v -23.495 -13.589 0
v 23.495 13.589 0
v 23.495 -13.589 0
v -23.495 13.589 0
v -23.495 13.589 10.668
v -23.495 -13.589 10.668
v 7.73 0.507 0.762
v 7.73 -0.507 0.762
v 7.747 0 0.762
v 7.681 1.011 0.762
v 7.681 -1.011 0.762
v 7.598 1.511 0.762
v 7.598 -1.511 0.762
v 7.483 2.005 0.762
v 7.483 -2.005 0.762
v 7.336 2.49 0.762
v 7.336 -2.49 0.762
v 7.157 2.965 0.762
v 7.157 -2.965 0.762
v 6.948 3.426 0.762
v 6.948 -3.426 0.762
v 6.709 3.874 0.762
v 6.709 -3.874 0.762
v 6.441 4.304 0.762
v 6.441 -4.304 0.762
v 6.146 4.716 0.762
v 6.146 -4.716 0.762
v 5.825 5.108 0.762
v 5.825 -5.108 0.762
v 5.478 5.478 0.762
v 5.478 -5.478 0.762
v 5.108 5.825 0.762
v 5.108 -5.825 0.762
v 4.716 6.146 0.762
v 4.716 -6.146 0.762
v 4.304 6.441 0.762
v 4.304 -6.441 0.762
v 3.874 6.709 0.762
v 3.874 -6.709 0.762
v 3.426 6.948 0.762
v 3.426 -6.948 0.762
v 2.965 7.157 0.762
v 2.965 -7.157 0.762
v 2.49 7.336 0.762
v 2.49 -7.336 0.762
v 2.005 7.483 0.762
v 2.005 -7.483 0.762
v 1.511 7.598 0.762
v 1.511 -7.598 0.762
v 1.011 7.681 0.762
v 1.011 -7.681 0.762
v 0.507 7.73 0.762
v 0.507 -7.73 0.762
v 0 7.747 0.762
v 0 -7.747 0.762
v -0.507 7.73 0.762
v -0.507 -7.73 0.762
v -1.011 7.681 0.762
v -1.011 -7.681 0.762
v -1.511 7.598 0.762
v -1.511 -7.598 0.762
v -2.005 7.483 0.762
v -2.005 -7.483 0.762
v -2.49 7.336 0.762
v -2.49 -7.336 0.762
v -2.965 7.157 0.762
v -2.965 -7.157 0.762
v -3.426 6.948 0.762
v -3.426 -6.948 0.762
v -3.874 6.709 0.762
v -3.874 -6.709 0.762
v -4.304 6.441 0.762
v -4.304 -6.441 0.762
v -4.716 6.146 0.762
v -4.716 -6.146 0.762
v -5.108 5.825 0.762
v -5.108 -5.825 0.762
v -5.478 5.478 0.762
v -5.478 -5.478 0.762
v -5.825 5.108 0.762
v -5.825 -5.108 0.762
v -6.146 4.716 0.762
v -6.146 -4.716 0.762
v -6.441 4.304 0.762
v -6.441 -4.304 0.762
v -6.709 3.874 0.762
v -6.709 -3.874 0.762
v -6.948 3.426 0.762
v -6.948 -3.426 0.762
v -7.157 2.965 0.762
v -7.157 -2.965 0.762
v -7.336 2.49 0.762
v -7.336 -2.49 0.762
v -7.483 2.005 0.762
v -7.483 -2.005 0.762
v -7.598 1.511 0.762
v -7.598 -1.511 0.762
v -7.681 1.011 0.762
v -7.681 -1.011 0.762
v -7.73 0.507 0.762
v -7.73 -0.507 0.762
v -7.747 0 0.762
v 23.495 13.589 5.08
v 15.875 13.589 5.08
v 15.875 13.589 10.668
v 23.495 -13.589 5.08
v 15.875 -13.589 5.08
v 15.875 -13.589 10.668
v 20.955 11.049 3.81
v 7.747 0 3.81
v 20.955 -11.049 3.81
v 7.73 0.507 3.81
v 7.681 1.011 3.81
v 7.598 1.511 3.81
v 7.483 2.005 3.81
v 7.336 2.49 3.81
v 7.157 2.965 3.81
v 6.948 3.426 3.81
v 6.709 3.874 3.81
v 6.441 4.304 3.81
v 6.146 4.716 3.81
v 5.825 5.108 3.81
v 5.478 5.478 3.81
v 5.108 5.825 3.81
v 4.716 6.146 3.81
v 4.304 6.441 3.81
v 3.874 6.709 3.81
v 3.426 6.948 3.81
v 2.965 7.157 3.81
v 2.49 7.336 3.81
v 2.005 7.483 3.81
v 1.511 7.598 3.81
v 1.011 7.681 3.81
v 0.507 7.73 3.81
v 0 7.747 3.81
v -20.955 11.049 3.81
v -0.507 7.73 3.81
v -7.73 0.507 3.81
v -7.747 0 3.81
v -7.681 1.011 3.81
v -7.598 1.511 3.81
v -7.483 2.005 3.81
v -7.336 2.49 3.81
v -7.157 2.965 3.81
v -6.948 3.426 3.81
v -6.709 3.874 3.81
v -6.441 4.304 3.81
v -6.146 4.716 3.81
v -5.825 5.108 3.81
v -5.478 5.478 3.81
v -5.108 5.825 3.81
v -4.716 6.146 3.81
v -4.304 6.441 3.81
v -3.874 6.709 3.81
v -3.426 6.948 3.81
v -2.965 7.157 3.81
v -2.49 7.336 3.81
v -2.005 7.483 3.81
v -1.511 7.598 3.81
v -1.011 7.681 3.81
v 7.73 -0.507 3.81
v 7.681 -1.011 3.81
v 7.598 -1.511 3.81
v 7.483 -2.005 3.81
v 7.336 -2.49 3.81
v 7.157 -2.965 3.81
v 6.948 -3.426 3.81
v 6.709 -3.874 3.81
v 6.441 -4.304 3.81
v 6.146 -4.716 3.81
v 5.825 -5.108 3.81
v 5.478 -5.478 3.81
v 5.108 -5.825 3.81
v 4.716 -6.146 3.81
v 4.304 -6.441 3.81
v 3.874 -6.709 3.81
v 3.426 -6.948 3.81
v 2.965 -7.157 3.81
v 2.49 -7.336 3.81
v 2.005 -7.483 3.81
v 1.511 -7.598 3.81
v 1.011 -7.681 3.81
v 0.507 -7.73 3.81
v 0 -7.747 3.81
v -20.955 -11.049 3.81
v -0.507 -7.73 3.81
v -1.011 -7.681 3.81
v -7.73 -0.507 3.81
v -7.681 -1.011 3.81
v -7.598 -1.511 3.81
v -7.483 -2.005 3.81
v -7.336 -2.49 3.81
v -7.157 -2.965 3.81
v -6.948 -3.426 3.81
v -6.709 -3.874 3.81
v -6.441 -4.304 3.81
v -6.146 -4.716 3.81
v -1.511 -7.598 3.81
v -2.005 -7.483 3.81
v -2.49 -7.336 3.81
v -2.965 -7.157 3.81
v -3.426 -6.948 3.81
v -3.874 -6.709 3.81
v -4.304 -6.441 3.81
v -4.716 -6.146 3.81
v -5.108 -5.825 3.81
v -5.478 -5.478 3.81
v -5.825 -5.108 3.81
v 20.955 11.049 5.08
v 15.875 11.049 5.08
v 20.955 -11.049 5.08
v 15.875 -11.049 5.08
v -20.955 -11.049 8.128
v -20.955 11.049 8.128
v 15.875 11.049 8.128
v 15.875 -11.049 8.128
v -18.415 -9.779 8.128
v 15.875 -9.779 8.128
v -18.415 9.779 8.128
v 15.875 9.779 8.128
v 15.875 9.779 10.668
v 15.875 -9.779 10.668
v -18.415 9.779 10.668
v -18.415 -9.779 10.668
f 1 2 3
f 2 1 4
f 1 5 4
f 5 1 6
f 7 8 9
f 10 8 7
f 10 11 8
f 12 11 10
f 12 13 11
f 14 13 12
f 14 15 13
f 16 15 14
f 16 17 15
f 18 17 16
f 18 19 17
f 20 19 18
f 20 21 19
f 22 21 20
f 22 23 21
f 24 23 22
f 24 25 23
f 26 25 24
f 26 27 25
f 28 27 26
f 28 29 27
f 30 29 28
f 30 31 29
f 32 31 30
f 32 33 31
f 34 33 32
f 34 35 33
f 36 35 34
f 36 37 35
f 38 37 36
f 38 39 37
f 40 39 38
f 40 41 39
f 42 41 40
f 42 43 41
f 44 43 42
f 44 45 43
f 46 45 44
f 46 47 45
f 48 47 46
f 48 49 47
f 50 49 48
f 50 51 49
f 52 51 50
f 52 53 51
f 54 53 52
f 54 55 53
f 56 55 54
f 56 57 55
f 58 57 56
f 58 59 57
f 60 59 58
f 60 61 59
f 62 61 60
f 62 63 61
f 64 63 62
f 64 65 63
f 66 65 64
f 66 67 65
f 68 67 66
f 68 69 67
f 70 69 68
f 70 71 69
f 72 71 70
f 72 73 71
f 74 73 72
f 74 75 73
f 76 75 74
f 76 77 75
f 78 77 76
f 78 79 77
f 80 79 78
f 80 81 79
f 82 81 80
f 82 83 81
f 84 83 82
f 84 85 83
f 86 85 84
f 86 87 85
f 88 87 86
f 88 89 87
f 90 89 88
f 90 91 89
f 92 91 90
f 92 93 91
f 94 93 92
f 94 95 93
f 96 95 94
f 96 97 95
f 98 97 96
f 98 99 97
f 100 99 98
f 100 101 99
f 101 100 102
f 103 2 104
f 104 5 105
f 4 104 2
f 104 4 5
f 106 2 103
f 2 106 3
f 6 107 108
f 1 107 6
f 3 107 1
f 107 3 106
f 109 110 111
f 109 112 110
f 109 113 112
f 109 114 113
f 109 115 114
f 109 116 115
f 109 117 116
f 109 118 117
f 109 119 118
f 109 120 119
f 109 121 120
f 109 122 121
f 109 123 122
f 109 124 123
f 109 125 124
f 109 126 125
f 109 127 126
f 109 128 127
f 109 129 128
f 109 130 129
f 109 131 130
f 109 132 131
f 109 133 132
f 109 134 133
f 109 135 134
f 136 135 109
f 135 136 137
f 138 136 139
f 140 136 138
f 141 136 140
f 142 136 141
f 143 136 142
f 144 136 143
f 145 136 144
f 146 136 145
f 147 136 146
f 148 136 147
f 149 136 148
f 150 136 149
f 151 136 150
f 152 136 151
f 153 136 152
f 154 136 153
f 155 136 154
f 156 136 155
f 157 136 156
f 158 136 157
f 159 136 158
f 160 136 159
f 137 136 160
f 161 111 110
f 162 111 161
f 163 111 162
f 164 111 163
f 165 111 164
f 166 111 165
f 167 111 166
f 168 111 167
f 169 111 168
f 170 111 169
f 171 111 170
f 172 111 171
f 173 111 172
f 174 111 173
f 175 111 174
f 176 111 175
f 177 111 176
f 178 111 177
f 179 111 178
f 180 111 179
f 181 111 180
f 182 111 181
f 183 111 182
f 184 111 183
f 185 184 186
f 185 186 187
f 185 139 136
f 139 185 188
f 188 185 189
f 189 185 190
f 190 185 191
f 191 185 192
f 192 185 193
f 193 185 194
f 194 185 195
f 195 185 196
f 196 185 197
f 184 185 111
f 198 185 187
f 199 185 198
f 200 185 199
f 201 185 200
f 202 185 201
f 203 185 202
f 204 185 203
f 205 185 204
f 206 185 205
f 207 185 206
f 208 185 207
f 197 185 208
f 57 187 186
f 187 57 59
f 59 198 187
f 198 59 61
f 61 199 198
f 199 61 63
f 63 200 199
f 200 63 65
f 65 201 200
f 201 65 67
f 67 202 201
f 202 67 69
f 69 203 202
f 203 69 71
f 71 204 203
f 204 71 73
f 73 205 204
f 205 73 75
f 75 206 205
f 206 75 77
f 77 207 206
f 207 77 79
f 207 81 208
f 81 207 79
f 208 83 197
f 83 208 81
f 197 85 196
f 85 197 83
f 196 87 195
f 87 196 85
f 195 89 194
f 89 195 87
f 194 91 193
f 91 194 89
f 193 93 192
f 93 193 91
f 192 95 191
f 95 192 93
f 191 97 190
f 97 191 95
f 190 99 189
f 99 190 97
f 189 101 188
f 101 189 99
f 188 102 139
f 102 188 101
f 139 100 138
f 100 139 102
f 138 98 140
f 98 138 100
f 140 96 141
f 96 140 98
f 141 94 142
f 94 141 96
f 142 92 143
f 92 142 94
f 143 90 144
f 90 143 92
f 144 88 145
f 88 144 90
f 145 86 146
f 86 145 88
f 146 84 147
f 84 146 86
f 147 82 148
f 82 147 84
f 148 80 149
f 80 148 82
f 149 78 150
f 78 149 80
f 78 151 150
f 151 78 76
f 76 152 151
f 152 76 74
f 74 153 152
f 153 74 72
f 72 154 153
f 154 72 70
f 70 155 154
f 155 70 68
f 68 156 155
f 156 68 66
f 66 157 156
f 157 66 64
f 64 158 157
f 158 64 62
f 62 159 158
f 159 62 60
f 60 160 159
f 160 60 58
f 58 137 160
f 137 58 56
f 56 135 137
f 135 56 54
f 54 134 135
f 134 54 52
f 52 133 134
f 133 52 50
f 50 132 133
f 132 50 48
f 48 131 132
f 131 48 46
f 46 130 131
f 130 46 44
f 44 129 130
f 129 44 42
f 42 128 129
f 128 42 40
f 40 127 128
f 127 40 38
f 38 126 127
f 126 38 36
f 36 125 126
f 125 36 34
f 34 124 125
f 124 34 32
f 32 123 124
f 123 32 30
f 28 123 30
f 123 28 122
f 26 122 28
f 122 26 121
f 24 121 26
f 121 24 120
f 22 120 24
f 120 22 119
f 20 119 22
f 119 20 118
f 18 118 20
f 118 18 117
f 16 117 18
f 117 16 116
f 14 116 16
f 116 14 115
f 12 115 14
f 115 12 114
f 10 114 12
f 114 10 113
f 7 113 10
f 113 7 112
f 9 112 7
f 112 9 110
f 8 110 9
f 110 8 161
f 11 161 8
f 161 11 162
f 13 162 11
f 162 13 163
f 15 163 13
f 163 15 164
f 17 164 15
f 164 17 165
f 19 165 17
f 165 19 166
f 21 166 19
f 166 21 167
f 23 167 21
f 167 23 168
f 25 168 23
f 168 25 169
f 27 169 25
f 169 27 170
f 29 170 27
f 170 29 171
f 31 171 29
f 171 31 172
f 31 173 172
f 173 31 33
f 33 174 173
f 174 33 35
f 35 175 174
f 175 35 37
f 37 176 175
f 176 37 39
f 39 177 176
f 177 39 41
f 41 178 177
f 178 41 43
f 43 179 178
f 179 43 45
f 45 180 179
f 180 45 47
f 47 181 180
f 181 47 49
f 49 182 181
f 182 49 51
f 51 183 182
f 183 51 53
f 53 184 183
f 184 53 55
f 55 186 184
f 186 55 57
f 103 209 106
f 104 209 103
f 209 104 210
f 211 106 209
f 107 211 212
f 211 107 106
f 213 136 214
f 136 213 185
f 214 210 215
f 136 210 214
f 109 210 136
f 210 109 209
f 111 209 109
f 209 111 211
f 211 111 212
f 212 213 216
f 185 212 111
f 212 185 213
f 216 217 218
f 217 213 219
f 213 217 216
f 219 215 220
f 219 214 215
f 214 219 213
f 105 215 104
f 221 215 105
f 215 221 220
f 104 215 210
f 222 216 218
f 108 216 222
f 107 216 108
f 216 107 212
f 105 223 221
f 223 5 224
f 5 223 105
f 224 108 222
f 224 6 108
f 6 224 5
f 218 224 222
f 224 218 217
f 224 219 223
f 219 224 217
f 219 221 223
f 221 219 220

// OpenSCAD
ViewScale = [0.0254, 0.0254, 0.0254];

module base()
{
    linear_extrude(30)
    //difference() {
    square([1850, 1070], center=true);
//        translate([400, 0, 0])
//        circle(80/2, $fn=96);
//        translate([-400, 0, 0])
//        circle(80/2, $fn=96);
//    }

    translate([0, 0, 30])
    linear_extrude(120)
    difference() {
    square([1850, 1070], center=true);
        translate([0, 0, 0])
        circle(610/2, $fn=96);
    }

    translate([0, 0, 80])
    linear_extrude(120)
    difference() {
        square([1850, 1070], center=true);
        square([1650, 870], center=true);
    }

    translate([0, 0, 200])
    linear_extrude(120)
    difference() {
        translate([-150, 0, 0])
        square([1550, 1070], center=true);
        square([1650, 870], center=true);
    }

    translate([0, 0, 320])
    linear_extrude(100)
    difference() {
        translate([-150, 0, 0])
        square([1550, 1070], center=true);
        translate([50, 0, 0])
        square([1550, 770], center=true);
    }



}

scale(ViewScale)
{
    base();
}
